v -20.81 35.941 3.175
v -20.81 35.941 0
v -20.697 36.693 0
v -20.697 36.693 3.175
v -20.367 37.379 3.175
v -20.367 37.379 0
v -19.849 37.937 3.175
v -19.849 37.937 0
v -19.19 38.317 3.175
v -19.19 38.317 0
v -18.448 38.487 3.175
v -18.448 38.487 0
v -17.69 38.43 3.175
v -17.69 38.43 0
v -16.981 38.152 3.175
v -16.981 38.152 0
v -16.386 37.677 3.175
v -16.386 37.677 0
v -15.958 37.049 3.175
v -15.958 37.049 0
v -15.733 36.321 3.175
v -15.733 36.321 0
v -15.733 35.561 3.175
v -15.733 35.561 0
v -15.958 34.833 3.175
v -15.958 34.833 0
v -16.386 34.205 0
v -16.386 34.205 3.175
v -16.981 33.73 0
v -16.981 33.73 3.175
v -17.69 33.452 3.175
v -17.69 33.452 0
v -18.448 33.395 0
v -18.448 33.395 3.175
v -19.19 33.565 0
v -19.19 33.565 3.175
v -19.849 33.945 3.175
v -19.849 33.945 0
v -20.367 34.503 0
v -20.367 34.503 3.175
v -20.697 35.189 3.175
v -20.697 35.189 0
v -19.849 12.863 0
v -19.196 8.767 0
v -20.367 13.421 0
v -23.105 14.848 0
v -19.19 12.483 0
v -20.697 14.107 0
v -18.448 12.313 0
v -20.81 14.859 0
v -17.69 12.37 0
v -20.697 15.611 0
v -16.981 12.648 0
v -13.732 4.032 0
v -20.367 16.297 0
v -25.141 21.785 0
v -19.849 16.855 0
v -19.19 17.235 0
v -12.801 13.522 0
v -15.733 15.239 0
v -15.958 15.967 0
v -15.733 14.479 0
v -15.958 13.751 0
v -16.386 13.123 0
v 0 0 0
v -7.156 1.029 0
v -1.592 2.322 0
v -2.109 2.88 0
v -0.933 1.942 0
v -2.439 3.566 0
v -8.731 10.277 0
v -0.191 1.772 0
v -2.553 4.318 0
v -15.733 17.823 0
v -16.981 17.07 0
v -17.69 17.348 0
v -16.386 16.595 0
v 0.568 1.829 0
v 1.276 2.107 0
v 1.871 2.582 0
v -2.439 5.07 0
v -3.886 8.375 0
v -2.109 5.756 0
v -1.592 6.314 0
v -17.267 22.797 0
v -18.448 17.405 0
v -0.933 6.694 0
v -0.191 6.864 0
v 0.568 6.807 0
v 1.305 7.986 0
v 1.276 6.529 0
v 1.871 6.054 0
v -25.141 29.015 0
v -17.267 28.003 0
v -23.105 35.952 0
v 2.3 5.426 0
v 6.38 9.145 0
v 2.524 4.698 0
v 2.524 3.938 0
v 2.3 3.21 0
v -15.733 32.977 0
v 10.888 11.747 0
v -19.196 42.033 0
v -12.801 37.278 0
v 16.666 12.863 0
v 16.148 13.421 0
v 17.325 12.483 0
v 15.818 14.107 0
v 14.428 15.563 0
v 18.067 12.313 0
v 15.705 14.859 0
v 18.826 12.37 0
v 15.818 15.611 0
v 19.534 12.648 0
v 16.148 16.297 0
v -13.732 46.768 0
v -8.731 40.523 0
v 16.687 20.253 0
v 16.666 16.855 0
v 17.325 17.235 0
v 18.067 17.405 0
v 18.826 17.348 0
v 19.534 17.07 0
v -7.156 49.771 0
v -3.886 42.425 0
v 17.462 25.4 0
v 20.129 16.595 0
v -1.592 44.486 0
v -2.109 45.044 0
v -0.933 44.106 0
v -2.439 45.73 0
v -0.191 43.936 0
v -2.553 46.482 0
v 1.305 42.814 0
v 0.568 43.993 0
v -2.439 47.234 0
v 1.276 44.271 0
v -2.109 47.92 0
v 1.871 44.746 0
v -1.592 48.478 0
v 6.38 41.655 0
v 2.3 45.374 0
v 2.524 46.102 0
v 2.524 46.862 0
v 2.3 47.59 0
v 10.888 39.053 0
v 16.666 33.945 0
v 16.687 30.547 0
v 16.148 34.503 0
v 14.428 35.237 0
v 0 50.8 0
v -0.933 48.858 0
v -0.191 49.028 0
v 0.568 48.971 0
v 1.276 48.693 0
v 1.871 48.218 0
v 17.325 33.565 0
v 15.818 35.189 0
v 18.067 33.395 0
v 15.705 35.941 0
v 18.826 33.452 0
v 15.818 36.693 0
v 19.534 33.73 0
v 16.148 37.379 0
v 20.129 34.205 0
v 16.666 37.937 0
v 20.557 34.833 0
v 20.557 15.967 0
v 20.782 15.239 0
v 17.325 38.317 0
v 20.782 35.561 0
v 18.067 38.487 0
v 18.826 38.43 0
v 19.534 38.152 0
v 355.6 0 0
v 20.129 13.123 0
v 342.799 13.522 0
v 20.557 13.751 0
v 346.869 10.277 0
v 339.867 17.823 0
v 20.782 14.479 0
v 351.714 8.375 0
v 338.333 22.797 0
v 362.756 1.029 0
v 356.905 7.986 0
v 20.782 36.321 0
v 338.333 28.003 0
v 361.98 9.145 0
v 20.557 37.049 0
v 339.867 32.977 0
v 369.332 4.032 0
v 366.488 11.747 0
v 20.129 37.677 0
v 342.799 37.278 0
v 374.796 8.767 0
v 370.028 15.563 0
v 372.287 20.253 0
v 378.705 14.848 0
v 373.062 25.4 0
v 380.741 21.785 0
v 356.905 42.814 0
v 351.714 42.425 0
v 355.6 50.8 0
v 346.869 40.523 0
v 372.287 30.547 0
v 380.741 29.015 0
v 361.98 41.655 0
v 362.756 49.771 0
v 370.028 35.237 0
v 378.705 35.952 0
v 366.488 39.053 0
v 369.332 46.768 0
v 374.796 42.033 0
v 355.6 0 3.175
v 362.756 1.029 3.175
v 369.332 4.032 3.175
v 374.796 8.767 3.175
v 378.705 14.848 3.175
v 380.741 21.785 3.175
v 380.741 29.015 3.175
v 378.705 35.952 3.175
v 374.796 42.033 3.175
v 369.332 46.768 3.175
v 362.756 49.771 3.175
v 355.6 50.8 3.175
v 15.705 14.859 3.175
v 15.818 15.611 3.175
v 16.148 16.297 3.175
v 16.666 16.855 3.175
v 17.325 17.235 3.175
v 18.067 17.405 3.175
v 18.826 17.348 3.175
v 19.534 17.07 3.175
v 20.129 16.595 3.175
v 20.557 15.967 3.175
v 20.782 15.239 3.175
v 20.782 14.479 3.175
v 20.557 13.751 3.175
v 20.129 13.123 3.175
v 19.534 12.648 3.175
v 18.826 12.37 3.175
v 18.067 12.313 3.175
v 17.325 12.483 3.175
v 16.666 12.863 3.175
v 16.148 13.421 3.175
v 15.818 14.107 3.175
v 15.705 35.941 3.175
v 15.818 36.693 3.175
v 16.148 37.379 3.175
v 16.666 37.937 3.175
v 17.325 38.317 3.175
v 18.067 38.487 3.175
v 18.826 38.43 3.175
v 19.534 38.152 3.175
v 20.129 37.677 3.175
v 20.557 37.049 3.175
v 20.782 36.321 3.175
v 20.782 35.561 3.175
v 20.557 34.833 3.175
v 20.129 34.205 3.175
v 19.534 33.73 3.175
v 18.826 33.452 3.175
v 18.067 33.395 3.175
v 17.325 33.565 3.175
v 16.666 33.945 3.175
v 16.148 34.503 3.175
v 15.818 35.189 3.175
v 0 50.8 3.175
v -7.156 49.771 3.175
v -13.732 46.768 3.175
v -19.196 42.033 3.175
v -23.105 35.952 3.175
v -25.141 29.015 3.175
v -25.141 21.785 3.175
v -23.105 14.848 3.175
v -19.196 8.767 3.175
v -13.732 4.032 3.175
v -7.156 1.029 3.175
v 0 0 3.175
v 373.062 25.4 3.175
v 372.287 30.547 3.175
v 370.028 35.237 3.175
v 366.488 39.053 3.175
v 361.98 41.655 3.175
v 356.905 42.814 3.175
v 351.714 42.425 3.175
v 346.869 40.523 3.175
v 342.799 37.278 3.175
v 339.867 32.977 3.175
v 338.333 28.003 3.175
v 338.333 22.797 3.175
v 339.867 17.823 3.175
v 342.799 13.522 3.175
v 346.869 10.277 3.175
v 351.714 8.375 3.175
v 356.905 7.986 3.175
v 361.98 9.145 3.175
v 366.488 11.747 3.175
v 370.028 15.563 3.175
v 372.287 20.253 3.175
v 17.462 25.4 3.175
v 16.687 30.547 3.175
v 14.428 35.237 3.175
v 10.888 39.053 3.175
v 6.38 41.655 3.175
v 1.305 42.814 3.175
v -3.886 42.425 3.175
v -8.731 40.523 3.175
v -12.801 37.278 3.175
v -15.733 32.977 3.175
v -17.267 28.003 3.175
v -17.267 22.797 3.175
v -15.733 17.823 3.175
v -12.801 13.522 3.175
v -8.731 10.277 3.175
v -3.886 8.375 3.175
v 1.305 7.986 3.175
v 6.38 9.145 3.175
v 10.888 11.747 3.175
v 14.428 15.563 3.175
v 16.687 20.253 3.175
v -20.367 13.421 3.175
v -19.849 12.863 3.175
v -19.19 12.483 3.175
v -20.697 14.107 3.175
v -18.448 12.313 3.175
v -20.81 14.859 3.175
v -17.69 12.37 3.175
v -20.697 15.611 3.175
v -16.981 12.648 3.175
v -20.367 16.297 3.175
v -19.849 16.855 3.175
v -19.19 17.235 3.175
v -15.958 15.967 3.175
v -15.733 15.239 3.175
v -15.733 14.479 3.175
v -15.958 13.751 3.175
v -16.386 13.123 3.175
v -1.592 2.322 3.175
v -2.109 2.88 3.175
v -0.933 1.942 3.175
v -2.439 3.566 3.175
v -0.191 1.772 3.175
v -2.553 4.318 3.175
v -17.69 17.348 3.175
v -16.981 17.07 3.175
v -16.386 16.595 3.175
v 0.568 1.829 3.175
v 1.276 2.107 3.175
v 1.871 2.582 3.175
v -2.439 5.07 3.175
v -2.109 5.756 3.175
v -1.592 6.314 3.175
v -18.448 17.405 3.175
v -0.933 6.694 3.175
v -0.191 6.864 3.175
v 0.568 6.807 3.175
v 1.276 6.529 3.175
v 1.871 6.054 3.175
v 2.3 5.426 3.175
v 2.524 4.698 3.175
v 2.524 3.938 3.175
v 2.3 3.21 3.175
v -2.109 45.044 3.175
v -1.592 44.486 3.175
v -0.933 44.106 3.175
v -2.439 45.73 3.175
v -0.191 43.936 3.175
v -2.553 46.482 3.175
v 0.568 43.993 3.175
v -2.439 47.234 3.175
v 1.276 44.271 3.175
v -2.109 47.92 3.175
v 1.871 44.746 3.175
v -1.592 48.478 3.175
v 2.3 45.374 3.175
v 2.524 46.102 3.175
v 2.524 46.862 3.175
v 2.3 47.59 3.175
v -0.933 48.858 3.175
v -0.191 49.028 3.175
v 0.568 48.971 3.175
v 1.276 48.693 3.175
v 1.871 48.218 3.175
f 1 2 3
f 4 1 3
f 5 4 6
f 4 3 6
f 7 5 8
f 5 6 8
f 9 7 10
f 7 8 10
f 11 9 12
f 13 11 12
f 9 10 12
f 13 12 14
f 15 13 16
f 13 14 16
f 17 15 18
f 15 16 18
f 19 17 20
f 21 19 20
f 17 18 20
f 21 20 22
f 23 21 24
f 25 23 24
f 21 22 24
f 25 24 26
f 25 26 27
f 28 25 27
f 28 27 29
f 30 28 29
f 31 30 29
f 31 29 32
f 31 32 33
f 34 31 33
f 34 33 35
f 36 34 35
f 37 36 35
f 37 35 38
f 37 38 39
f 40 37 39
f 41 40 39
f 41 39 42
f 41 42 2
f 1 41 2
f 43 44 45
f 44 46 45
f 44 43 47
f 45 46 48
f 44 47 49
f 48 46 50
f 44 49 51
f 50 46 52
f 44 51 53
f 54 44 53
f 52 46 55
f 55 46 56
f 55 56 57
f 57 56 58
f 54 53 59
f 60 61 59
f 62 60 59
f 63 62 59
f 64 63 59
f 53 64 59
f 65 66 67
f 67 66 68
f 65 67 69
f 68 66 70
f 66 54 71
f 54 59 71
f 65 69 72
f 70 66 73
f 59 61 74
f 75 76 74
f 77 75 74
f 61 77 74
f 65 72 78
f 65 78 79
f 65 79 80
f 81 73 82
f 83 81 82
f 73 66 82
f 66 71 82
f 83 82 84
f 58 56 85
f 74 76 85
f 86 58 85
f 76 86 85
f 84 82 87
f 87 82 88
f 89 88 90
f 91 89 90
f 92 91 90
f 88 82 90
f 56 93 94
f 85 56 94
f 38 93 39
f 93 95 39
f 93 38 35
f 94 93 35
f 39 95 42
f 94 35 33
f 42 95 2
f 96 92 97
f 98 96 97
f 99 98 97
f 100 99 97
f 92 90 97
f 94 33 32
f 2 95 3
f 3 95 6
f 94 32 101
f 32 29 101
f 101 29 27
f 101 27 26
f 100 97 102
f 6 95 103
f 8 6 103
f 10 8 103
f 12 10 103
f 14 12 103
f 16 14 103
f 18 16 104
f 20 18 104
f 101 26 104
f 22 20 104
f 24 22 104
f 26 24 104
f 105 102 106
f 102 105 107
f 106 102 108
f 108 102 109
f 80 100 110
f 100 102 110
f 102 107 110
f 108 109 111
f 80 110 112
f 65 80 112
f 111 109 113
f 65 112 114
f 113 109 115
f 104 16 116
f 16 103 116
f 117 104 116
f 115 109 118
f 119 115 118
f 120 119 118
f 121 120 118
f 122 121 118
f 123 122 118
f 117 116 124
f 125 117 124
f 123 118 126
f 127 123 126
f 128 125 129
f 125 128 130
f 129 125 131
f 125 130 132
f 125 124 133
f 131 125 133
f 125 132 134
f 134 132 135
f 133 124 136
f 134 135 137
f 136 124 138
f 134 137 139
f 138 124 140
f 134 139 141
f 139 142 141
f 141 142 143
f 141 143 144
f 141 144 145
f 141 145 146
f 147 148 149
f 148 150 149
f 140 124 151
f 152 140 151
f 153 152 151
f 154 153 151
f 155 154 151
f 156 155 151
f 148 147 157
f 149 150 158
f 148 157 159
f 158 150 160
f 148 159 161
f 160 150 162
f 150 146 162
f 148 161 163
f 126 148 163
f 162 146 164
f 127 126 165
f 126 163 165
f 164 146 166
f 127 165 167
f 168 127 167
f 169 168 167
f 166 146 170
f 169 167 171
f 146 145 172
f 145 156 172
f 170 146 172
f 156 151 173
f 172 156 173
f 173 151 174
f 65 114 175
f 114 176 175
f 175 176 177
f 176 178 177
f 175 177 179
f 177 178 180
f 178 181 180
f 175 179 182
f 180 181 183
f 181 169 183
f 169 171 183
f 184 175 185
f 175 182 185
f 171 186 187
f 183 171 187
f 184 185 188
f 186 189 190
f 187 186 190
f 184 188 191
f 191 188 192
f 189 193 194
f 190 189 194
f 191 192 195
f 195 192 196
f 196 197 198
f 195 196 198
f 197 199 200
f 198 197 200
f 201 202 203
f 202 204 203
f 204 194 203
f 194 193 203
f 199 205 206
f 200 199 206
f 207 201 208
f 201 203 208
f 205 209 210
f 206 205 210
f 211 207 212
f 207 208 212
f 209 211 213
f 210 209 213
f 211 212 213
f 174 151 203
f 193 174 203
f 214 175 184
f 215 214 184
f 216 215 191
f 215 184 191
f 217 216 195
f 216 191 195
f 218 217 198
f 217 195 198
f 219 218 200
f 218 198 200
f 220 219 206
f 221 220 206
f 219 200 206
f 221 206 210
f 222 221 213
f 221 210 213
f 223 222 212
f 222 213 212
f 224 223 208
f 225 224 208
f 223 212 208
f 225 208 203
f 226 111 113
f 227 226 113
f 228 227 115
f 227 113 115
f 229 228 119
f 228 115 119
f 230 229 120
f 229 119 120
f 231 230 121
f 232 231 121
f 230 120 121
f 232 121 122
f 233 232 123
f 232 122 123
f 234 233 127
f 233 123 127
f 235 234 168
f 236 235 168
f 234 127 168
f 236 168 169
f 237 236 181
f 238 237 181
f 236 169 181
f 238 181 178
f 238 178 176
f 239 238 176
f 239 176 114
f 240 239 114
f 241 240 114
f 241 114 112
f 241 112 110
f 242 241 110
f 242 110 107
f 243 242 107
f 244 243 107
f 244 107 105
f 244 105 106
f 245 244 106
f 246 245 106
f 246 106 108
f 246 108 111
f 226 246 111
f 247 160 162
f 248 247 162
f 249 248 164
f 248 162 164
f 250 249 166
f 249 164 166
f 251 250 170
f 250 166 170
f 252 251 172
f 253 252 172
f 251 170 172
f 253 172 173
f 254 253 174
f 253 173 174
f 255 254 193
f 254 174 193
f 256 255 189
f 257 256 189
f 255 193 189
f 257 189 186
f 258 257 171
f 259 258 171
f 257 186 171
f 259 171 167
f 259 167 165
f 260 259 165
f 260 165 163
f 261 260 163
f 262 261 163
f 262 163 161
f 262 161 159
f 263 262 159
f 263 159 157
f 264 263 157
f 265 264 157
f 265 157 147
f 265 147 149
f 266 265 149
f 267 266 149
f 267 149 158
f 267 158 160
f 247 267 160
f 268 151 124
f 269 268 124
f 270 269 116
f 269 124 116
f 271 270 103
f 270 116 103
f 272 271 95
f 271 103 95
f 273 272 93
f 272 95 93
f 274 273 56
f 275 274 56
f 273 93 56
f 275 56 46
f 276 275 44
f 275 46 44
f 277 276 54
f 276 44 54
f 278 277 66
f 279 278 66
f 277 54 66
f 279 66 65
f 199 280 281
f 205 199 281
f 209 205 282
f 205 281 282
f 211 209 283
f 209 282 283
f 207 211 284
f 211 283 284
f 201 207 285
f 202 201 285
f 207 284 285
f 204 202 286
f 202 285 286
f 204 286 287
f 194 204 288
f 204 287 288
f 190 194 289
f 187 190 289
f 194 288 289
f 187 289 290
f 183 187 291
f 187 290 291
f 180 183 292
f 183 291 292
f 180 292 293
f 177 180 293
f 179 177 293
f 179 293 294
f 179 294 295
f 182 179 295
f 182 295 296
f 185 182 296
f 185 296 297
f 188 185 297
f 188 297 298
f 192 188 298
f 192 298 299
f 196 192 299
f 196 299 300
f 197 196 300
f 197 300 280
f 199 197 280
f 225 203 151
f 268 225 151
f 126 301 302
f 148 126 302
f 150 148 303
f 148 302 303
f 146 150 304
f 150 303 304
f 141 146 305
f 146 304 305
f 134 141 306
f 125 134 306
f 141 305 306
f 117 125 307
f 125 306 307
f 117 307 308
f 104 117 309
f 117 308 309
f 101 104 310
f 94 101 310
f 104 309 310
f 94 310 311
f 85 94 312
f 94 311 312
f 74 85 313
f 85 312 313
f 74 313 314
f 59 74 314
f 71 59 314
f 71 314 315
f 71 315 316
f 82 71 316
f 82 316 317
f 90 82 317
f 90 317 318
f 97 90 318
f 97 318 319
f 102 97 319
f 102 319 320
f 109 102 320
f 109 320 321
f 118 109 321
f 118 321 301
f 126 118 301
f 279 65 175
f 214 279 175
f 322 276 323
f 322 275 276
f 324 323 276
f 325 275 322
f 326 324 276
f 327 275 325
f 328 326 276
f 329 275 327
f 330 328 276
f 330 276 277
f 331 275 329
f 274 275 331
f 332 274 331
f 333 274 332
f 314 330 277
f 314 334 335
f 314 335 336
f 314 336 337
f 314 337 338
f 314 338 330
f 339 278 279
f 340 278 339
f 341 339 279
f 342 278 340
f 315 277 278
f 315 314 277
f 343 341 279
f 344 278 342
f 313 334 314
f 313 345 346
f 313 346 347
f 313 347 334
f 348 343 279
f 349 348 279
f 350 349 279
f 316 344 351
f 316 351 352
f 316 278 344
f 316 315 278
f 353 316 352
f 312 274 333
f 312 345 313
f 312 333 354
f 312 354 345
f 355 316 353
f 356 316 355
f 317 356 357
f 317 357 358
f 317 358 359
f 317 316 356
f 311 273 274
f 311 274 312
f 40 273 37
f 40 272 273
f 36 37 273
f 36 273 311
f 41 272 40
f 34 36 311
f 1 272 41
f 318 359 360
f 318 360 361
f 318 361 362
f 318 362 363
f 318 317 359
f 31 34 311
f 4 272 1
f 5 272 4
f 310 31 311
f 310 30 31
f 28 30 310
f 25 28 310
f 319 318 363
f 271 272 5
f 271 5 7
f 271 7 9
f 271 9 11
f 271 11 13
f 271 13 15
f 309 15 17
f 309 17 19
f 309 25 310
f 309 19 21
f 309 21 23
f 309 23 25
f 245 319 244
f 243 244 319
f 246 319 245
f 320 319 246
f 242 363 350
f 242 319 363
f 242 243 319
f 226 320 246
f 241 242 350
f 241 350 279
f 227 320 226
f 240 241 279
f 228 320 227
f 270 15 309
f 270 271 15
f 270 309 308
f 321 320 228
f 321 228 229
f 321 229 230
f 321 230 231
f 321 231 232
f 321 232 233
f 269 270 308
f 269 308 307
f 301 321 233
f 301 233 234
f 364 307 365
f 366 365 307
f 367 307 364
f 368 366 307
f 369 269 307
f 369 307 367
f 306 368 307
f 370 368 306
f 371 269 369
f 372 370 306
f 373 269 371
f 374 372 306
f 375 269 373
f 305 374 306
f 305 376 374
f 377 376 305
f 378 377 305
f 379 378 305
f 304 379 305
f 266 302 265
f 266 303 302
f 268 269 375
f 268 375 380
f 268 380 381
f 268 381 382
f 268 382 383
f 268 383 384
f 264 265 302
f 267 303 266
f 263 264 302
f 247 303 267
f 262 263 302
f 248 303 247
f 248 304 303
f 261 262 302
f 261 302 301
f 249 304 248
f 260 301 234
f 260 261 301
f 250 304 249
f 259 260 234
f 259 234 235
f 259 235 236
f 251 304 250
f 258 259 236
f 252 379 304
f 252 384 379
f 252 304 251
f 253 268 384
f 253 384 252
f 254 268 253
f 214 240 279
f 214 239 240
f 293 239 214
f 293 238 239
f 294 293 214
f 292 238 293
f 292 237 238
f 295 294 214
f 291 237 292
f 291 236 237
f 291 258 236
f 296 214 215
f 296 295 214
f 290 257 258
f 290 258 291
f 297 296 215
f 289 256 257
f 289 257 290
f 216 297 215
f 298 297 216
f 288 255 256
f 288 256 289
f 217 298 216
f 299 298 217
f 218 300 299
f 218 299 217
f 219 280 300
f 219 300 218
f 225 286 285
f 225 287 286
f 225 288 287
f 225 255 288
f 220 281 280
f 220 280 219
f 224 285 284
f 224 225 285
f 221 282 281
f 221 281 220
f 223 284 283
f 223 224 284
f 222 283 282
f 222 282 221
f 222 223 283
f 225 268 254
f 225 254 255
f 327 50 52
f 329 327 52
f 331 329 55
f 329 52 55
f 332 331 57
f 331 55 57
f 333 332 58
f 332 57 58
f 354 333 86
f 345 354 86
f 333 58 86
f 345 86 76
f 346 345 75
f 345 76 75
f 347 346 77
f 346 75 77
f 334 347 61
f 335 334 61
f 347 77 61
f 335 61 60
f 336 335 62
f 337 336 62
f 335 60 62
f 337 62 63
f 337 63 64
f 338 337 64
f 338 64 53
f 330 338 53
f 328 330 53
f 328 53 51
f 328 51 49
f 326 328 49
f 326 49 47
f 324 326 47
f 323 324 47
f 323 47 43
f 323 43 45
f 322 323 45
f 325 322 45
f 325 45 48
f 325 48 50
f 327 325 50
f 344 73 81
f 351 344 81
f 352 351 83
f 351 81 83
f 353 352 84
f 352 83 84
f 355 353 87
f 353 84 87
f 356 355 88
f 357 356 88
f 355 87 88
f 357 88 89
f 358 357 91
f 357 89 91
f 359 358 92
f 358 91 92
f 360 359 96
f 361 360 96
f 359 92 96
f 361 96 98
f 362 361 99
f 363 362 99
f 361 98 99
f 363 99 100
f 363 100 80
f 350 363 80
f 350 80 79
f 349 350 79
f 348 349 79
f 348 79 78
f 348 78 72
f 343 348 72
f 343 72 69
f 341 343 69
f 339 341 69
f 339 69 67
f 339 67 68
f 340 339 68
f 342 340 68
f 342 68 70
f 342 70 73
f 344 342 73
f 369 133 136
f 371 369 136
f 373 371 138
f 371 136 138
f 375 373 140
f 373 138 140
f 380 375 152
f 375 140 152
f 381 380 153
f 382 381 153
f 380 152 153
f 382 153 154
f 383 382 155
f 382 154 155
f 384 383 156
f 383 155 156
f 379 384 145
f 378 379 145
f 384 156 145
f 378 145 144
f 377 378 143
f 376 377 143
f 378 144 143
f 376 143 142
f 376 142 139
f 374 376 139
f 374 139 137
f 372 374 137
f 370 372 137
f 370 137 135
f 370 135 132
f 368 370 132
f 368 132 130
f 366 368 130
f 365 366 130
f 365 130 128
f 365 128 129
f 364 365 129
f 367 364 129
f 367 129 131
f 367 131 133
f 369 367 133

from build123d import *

# Parameters (mm, degrees)
BOSS_EXTRUDE1_DEPTH    = 3.175
SKETCH2_R              = 17.4625
CUT_EXTRUDE1_DEPTH     = 385.384860036
F_10_CLEARANCE_HOLE1_D = 5.1054


with BuildPart() as part:
    # Sketch1 → Boss-Extrude1 (new body)
    with BuildSketch(Plane.XY):
        with BuildLine():
            Line((0, 0), (355.6, 0))
            ThreePointArc((355.6, 0), (381, 25.4), (355.6, 50.8))
            Line((355.6, 50.8), (0, 50.8))
            ThreePointArc((0, 50.8), (-25.4, 25.4), (0, 0))
        make_face()
    extrude(amount=BOSS_EXTRUDE1_DEPTH)

    # Sketch2 → Cut-Extrude1 (cut, through all)
    with BuildSketch(Plane.XY.offset(3.175)):
        with Locations((0, 25.4)):
            Circle(SKETCH2_R)
        with Locations((355.6, 25.4)):
            Circle(SKETCH2_R)
    extrude(amount=-CUT_EXTRUDE1_DEPTH, mode=Mode.SUBTRACT)

    # #10 Clearance Hole1 (through all)
    with Locations(Plane(origin=(18.257547563, 35.941, 3.175), x_dir=(1, 0, 0), z_dir=(0, 0, 1))):
        with Locations((0, 0), (0, -21.082), (-18.257547563, -31.623), (-36.515095126, -21.082), (-36.515095126, 0), (-18.257547563, 10.541)):
            Hole(F_10_CLEARANCE_HOLE1_D / 2)


solid = part.part
